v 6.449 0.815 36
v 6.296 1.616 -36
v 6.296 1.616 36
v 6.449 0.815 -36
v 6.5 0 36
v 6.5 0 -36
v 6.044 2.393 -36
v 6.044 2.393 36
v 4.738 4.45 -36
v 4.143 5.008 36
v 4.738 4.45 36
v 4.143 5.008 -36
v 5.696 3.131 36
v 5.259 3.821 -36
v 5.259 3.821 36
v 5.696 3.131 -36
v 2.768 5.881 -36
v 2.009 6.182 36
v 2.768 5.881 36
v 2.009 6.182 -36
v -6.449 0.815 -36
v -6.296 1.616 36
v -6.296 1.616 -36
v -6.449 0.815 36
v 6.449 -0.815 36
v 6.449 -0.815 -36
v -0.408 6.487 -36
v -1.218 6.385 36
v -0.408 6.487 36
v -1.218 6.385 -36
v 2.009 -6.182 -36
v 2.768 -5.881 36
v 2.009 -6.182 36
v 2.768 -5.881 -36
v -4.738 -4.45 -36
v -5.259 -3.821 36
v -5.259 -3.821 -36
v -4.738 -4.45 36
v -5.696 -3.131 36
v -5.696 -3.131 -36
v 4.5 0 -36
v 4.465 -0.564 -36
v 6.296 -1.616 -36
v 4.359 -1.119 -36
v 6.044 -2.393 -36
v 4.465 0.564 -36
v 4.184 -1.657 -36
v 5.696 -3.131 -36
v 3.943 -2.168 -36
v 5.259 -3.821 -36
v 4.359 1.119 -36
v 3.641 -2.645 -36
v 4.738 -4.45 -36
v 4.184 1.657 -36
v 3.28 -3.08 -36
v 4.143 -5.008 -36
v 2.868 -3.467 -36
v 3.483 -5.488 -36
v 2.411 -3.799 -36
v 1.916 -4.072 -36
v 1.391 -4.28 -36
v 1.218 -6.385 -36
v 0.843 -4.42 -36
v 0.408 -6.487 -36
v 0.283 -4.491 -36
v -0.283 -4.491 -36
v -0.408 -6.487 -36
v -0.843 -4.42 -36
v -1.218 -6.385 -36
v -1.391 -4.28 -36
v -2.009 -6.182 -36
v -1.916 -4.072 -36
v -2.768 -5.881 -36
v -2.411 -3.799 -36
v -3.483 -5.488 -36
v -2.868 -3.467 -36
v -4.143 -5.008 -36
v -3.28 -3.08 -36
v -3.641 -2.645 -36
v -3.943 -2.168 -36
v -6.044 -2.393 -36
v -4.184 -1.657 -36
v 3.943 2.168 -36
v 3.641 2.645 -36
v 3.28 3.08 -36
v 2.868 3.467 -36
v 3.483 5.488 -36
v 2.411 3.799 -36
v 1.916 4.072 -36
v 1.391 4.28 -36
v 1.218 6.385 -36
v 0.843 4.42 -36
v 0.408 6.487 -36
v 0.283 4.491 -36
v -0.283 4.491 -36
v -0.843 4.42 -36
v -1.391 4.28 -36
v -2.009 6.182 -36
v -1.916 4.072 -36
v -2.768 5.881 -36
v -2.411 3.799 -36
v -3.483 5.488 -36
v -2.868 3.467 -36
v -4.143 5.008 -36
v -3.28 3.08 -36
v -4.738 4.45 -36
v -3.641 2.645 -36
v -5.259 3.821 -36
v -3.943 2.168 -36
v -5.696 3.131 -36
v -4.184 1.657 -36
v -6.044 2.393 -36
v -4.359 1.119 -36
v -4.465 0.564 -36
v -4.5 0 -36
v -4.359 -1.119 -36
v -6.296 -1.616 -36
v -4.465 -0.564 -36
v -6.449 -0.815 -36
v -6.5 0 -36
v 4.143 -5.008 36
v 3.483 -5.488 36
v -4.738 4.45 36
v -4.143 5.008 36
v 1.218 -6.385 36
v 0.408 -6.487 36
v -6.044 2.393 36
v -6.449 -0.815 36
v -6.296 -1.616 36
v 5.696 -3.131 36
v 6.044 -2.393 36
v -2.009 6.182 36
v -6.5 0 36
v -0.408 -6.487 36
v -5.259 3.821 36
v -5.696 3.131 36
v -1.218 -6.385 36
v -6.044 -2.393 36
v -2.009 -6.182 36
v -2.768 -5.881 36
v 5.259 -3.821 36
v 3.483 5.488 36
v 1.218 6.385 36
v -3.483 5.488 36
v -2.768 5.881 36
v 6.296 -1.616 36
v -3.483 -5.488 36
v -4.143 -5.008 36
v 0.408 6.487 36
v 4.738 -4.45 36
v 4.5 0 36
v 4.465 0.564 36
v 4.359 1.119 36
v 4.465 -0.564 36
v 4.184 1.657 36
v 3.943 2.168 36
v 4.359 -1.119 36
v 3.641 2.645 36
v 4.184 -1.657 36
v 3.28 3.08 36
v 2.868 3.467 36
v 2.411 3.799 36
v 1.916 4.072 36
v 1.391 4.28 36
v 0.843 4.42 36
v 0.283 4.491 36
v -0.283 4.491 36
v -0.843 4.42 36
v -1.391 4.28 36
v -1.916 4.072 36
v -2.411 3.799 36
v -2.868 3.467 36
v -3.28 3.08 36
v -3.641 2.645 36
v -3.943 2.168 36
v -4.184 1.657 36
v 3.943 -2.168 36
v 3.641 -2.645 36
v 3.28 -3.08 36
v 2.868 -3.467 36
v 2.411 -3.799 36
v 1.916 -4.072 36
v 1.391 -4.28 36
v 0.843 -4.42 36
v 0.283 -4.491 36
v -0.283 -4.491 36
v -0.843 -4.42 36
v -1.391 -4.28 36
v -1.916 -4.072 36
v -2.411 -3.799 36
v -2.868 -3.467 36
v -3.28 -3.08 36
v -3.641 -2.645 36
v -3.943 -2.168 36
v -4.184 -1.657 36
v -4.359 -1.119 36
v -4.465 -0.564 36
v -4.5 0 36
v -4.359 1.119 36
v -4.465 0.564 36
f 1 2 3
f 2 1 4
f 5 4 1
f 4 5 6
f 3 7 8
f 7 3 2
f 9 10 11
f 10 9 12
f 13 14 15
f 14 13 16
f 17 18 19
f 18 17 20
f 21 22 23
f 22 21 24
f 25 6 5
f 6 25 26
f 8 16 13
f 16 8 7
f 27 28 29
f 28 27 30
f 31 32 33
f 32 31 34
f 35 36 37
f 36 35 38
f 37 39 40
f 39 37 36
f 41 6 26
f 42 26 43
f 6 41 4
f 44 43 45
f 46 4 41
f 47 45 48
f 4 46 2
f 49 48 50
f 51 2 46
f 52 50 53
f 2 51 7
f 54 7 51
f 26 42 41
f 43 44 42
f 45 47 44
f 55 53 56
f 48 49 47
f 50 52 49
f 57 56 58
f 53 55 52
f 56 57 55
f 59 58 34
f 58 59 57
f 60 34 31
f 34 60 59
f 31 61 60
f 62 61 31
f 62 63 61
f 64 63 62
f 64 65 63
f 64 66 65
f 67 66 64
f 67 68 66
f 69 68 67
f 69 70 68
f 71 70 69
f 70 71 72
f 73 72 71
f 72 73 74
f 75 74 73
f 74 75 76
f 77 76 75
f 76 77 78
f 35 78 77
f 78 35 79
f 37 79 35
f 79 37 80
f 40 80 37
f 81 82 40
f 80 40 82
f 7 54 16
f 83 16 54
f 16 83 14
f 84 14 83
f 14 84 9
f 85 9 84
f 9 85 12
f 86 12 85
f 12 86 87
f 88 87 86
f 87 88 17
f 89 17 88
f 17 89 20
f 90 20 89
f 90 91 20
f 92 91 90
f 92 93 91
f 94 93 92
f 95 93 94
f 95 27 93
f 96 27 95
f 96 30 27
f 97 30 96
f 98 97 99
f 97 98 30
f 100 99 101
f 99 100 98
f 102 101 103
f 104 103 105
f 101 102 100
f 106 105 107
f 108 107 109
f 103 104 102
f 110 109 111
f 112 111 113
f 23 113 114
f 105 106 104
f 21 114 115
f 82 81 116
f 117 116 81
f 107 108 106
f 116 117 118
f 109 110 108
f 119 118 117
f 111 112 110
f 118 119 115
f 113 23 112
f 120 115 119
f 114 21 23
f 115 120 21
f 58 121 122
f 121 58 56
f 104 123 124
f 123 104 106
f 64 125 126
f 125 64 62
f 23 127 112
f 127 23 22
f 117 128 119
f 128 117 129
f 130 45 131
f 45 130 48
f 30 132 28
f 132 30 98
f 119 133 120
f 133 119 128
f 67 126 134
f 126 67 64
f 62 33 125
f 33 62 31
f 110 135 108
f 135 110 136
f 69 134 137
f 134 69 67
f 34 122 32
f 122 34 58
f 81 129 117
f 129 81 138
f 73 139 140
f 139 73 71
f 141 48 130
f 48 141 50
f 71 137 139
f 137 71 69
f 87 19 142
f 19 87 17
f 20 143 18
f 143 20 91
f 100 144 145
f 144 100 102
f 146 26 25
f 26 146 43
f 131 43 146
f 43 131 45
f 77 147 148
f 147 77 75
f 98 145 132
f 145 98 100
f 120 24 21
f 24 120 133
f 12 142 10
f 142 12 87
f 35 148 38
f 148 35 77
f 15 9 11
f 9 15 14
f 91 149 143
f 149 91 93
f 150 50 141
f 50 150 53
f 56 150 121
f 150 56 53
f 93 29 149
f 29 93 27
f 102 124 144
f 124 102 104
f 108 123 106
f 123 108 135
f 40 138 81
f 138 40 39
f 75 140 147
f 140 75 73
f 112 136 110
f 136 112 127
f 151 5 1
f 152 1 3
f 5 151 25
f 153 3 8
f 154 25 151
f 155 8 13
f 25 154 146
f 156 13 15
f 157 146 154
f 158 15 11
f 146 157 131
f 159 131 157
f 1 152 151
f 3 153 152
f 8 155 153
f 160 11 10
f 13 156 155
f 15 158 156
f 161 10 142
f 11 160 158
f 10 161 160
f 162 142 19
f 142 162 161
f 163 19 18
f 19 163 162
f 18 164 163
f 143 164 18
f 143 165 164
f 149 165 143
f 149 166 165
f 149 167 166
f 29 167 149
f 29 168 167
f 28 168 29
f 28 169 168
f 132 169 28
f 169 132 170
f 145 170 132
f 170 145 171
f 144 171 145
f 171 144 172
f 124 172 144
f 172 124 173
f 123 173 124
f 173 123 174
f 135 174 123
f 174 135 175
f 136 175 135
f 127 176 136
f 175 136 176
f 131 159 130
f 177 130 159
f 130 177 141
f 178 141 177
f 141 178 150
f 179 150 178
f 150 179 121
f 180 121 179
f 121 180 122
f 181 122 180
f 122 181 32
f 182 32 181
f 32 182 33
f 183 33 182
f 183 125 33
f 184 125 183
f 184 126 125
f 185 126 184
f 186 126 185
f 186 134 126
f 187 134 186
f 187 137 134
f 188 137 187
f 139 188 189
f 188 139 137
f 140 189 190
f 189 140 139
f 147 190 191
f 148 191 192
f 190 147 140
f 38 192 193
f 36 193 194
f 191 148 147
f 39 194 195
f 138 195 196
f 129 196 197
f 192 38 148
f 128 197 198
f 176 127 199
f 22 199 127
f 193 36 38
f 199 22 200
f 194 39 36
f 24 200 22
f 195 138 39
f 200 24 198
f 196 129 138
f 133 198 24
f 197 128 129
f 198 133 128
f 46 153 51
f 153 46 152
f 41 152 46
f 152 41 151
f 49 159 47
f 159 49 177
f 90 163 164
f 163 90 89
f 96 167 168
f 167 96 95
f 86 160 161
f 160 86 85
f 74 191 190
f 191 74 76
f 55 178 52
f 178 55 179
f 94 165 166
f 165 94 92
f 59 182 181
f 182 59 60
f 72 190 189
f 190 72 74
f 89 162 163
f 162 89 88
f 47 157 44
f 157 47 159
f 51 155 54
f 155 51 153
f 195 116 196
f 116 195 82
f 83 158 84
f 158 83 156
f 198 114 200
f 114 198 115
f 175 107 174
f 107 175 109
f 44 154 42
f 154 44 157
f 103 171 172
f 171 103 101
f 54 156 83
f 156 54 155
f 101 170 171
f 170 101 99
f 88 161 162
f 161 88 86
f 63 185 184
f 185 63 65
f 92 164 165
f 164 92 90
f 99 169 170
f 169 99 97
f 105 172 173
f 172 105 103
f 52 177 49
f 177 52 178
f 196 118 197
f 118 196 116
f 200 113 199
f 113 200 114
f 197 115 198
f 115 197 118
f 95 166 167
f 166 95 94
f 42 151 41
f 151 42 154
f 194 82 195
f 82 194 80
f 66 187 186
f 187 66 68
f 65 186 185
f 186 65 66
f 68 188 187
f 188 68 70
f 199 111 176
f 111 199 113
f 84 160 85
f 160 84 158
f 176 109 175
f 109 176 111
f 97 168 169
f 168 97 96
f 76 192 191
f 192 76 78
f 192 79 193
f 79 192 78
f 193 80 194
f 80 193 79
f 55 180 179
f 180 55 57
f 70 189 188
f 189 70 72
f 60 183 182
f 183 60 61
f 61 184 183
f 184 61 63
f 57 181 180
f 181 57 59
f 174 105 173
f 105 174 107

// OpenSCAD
$fn = 50;


difference() {
	union() {
		translate(v = [0, 0, -36.0000000000]) {
			cylinder(h = 72, r = 6.5000000000);
		}
	}
	union() {
		translate(v = [0, 0, -100.0000000000]) {
			cylinder(h = 200, r = 4.5000000000);
		}
	}
}
